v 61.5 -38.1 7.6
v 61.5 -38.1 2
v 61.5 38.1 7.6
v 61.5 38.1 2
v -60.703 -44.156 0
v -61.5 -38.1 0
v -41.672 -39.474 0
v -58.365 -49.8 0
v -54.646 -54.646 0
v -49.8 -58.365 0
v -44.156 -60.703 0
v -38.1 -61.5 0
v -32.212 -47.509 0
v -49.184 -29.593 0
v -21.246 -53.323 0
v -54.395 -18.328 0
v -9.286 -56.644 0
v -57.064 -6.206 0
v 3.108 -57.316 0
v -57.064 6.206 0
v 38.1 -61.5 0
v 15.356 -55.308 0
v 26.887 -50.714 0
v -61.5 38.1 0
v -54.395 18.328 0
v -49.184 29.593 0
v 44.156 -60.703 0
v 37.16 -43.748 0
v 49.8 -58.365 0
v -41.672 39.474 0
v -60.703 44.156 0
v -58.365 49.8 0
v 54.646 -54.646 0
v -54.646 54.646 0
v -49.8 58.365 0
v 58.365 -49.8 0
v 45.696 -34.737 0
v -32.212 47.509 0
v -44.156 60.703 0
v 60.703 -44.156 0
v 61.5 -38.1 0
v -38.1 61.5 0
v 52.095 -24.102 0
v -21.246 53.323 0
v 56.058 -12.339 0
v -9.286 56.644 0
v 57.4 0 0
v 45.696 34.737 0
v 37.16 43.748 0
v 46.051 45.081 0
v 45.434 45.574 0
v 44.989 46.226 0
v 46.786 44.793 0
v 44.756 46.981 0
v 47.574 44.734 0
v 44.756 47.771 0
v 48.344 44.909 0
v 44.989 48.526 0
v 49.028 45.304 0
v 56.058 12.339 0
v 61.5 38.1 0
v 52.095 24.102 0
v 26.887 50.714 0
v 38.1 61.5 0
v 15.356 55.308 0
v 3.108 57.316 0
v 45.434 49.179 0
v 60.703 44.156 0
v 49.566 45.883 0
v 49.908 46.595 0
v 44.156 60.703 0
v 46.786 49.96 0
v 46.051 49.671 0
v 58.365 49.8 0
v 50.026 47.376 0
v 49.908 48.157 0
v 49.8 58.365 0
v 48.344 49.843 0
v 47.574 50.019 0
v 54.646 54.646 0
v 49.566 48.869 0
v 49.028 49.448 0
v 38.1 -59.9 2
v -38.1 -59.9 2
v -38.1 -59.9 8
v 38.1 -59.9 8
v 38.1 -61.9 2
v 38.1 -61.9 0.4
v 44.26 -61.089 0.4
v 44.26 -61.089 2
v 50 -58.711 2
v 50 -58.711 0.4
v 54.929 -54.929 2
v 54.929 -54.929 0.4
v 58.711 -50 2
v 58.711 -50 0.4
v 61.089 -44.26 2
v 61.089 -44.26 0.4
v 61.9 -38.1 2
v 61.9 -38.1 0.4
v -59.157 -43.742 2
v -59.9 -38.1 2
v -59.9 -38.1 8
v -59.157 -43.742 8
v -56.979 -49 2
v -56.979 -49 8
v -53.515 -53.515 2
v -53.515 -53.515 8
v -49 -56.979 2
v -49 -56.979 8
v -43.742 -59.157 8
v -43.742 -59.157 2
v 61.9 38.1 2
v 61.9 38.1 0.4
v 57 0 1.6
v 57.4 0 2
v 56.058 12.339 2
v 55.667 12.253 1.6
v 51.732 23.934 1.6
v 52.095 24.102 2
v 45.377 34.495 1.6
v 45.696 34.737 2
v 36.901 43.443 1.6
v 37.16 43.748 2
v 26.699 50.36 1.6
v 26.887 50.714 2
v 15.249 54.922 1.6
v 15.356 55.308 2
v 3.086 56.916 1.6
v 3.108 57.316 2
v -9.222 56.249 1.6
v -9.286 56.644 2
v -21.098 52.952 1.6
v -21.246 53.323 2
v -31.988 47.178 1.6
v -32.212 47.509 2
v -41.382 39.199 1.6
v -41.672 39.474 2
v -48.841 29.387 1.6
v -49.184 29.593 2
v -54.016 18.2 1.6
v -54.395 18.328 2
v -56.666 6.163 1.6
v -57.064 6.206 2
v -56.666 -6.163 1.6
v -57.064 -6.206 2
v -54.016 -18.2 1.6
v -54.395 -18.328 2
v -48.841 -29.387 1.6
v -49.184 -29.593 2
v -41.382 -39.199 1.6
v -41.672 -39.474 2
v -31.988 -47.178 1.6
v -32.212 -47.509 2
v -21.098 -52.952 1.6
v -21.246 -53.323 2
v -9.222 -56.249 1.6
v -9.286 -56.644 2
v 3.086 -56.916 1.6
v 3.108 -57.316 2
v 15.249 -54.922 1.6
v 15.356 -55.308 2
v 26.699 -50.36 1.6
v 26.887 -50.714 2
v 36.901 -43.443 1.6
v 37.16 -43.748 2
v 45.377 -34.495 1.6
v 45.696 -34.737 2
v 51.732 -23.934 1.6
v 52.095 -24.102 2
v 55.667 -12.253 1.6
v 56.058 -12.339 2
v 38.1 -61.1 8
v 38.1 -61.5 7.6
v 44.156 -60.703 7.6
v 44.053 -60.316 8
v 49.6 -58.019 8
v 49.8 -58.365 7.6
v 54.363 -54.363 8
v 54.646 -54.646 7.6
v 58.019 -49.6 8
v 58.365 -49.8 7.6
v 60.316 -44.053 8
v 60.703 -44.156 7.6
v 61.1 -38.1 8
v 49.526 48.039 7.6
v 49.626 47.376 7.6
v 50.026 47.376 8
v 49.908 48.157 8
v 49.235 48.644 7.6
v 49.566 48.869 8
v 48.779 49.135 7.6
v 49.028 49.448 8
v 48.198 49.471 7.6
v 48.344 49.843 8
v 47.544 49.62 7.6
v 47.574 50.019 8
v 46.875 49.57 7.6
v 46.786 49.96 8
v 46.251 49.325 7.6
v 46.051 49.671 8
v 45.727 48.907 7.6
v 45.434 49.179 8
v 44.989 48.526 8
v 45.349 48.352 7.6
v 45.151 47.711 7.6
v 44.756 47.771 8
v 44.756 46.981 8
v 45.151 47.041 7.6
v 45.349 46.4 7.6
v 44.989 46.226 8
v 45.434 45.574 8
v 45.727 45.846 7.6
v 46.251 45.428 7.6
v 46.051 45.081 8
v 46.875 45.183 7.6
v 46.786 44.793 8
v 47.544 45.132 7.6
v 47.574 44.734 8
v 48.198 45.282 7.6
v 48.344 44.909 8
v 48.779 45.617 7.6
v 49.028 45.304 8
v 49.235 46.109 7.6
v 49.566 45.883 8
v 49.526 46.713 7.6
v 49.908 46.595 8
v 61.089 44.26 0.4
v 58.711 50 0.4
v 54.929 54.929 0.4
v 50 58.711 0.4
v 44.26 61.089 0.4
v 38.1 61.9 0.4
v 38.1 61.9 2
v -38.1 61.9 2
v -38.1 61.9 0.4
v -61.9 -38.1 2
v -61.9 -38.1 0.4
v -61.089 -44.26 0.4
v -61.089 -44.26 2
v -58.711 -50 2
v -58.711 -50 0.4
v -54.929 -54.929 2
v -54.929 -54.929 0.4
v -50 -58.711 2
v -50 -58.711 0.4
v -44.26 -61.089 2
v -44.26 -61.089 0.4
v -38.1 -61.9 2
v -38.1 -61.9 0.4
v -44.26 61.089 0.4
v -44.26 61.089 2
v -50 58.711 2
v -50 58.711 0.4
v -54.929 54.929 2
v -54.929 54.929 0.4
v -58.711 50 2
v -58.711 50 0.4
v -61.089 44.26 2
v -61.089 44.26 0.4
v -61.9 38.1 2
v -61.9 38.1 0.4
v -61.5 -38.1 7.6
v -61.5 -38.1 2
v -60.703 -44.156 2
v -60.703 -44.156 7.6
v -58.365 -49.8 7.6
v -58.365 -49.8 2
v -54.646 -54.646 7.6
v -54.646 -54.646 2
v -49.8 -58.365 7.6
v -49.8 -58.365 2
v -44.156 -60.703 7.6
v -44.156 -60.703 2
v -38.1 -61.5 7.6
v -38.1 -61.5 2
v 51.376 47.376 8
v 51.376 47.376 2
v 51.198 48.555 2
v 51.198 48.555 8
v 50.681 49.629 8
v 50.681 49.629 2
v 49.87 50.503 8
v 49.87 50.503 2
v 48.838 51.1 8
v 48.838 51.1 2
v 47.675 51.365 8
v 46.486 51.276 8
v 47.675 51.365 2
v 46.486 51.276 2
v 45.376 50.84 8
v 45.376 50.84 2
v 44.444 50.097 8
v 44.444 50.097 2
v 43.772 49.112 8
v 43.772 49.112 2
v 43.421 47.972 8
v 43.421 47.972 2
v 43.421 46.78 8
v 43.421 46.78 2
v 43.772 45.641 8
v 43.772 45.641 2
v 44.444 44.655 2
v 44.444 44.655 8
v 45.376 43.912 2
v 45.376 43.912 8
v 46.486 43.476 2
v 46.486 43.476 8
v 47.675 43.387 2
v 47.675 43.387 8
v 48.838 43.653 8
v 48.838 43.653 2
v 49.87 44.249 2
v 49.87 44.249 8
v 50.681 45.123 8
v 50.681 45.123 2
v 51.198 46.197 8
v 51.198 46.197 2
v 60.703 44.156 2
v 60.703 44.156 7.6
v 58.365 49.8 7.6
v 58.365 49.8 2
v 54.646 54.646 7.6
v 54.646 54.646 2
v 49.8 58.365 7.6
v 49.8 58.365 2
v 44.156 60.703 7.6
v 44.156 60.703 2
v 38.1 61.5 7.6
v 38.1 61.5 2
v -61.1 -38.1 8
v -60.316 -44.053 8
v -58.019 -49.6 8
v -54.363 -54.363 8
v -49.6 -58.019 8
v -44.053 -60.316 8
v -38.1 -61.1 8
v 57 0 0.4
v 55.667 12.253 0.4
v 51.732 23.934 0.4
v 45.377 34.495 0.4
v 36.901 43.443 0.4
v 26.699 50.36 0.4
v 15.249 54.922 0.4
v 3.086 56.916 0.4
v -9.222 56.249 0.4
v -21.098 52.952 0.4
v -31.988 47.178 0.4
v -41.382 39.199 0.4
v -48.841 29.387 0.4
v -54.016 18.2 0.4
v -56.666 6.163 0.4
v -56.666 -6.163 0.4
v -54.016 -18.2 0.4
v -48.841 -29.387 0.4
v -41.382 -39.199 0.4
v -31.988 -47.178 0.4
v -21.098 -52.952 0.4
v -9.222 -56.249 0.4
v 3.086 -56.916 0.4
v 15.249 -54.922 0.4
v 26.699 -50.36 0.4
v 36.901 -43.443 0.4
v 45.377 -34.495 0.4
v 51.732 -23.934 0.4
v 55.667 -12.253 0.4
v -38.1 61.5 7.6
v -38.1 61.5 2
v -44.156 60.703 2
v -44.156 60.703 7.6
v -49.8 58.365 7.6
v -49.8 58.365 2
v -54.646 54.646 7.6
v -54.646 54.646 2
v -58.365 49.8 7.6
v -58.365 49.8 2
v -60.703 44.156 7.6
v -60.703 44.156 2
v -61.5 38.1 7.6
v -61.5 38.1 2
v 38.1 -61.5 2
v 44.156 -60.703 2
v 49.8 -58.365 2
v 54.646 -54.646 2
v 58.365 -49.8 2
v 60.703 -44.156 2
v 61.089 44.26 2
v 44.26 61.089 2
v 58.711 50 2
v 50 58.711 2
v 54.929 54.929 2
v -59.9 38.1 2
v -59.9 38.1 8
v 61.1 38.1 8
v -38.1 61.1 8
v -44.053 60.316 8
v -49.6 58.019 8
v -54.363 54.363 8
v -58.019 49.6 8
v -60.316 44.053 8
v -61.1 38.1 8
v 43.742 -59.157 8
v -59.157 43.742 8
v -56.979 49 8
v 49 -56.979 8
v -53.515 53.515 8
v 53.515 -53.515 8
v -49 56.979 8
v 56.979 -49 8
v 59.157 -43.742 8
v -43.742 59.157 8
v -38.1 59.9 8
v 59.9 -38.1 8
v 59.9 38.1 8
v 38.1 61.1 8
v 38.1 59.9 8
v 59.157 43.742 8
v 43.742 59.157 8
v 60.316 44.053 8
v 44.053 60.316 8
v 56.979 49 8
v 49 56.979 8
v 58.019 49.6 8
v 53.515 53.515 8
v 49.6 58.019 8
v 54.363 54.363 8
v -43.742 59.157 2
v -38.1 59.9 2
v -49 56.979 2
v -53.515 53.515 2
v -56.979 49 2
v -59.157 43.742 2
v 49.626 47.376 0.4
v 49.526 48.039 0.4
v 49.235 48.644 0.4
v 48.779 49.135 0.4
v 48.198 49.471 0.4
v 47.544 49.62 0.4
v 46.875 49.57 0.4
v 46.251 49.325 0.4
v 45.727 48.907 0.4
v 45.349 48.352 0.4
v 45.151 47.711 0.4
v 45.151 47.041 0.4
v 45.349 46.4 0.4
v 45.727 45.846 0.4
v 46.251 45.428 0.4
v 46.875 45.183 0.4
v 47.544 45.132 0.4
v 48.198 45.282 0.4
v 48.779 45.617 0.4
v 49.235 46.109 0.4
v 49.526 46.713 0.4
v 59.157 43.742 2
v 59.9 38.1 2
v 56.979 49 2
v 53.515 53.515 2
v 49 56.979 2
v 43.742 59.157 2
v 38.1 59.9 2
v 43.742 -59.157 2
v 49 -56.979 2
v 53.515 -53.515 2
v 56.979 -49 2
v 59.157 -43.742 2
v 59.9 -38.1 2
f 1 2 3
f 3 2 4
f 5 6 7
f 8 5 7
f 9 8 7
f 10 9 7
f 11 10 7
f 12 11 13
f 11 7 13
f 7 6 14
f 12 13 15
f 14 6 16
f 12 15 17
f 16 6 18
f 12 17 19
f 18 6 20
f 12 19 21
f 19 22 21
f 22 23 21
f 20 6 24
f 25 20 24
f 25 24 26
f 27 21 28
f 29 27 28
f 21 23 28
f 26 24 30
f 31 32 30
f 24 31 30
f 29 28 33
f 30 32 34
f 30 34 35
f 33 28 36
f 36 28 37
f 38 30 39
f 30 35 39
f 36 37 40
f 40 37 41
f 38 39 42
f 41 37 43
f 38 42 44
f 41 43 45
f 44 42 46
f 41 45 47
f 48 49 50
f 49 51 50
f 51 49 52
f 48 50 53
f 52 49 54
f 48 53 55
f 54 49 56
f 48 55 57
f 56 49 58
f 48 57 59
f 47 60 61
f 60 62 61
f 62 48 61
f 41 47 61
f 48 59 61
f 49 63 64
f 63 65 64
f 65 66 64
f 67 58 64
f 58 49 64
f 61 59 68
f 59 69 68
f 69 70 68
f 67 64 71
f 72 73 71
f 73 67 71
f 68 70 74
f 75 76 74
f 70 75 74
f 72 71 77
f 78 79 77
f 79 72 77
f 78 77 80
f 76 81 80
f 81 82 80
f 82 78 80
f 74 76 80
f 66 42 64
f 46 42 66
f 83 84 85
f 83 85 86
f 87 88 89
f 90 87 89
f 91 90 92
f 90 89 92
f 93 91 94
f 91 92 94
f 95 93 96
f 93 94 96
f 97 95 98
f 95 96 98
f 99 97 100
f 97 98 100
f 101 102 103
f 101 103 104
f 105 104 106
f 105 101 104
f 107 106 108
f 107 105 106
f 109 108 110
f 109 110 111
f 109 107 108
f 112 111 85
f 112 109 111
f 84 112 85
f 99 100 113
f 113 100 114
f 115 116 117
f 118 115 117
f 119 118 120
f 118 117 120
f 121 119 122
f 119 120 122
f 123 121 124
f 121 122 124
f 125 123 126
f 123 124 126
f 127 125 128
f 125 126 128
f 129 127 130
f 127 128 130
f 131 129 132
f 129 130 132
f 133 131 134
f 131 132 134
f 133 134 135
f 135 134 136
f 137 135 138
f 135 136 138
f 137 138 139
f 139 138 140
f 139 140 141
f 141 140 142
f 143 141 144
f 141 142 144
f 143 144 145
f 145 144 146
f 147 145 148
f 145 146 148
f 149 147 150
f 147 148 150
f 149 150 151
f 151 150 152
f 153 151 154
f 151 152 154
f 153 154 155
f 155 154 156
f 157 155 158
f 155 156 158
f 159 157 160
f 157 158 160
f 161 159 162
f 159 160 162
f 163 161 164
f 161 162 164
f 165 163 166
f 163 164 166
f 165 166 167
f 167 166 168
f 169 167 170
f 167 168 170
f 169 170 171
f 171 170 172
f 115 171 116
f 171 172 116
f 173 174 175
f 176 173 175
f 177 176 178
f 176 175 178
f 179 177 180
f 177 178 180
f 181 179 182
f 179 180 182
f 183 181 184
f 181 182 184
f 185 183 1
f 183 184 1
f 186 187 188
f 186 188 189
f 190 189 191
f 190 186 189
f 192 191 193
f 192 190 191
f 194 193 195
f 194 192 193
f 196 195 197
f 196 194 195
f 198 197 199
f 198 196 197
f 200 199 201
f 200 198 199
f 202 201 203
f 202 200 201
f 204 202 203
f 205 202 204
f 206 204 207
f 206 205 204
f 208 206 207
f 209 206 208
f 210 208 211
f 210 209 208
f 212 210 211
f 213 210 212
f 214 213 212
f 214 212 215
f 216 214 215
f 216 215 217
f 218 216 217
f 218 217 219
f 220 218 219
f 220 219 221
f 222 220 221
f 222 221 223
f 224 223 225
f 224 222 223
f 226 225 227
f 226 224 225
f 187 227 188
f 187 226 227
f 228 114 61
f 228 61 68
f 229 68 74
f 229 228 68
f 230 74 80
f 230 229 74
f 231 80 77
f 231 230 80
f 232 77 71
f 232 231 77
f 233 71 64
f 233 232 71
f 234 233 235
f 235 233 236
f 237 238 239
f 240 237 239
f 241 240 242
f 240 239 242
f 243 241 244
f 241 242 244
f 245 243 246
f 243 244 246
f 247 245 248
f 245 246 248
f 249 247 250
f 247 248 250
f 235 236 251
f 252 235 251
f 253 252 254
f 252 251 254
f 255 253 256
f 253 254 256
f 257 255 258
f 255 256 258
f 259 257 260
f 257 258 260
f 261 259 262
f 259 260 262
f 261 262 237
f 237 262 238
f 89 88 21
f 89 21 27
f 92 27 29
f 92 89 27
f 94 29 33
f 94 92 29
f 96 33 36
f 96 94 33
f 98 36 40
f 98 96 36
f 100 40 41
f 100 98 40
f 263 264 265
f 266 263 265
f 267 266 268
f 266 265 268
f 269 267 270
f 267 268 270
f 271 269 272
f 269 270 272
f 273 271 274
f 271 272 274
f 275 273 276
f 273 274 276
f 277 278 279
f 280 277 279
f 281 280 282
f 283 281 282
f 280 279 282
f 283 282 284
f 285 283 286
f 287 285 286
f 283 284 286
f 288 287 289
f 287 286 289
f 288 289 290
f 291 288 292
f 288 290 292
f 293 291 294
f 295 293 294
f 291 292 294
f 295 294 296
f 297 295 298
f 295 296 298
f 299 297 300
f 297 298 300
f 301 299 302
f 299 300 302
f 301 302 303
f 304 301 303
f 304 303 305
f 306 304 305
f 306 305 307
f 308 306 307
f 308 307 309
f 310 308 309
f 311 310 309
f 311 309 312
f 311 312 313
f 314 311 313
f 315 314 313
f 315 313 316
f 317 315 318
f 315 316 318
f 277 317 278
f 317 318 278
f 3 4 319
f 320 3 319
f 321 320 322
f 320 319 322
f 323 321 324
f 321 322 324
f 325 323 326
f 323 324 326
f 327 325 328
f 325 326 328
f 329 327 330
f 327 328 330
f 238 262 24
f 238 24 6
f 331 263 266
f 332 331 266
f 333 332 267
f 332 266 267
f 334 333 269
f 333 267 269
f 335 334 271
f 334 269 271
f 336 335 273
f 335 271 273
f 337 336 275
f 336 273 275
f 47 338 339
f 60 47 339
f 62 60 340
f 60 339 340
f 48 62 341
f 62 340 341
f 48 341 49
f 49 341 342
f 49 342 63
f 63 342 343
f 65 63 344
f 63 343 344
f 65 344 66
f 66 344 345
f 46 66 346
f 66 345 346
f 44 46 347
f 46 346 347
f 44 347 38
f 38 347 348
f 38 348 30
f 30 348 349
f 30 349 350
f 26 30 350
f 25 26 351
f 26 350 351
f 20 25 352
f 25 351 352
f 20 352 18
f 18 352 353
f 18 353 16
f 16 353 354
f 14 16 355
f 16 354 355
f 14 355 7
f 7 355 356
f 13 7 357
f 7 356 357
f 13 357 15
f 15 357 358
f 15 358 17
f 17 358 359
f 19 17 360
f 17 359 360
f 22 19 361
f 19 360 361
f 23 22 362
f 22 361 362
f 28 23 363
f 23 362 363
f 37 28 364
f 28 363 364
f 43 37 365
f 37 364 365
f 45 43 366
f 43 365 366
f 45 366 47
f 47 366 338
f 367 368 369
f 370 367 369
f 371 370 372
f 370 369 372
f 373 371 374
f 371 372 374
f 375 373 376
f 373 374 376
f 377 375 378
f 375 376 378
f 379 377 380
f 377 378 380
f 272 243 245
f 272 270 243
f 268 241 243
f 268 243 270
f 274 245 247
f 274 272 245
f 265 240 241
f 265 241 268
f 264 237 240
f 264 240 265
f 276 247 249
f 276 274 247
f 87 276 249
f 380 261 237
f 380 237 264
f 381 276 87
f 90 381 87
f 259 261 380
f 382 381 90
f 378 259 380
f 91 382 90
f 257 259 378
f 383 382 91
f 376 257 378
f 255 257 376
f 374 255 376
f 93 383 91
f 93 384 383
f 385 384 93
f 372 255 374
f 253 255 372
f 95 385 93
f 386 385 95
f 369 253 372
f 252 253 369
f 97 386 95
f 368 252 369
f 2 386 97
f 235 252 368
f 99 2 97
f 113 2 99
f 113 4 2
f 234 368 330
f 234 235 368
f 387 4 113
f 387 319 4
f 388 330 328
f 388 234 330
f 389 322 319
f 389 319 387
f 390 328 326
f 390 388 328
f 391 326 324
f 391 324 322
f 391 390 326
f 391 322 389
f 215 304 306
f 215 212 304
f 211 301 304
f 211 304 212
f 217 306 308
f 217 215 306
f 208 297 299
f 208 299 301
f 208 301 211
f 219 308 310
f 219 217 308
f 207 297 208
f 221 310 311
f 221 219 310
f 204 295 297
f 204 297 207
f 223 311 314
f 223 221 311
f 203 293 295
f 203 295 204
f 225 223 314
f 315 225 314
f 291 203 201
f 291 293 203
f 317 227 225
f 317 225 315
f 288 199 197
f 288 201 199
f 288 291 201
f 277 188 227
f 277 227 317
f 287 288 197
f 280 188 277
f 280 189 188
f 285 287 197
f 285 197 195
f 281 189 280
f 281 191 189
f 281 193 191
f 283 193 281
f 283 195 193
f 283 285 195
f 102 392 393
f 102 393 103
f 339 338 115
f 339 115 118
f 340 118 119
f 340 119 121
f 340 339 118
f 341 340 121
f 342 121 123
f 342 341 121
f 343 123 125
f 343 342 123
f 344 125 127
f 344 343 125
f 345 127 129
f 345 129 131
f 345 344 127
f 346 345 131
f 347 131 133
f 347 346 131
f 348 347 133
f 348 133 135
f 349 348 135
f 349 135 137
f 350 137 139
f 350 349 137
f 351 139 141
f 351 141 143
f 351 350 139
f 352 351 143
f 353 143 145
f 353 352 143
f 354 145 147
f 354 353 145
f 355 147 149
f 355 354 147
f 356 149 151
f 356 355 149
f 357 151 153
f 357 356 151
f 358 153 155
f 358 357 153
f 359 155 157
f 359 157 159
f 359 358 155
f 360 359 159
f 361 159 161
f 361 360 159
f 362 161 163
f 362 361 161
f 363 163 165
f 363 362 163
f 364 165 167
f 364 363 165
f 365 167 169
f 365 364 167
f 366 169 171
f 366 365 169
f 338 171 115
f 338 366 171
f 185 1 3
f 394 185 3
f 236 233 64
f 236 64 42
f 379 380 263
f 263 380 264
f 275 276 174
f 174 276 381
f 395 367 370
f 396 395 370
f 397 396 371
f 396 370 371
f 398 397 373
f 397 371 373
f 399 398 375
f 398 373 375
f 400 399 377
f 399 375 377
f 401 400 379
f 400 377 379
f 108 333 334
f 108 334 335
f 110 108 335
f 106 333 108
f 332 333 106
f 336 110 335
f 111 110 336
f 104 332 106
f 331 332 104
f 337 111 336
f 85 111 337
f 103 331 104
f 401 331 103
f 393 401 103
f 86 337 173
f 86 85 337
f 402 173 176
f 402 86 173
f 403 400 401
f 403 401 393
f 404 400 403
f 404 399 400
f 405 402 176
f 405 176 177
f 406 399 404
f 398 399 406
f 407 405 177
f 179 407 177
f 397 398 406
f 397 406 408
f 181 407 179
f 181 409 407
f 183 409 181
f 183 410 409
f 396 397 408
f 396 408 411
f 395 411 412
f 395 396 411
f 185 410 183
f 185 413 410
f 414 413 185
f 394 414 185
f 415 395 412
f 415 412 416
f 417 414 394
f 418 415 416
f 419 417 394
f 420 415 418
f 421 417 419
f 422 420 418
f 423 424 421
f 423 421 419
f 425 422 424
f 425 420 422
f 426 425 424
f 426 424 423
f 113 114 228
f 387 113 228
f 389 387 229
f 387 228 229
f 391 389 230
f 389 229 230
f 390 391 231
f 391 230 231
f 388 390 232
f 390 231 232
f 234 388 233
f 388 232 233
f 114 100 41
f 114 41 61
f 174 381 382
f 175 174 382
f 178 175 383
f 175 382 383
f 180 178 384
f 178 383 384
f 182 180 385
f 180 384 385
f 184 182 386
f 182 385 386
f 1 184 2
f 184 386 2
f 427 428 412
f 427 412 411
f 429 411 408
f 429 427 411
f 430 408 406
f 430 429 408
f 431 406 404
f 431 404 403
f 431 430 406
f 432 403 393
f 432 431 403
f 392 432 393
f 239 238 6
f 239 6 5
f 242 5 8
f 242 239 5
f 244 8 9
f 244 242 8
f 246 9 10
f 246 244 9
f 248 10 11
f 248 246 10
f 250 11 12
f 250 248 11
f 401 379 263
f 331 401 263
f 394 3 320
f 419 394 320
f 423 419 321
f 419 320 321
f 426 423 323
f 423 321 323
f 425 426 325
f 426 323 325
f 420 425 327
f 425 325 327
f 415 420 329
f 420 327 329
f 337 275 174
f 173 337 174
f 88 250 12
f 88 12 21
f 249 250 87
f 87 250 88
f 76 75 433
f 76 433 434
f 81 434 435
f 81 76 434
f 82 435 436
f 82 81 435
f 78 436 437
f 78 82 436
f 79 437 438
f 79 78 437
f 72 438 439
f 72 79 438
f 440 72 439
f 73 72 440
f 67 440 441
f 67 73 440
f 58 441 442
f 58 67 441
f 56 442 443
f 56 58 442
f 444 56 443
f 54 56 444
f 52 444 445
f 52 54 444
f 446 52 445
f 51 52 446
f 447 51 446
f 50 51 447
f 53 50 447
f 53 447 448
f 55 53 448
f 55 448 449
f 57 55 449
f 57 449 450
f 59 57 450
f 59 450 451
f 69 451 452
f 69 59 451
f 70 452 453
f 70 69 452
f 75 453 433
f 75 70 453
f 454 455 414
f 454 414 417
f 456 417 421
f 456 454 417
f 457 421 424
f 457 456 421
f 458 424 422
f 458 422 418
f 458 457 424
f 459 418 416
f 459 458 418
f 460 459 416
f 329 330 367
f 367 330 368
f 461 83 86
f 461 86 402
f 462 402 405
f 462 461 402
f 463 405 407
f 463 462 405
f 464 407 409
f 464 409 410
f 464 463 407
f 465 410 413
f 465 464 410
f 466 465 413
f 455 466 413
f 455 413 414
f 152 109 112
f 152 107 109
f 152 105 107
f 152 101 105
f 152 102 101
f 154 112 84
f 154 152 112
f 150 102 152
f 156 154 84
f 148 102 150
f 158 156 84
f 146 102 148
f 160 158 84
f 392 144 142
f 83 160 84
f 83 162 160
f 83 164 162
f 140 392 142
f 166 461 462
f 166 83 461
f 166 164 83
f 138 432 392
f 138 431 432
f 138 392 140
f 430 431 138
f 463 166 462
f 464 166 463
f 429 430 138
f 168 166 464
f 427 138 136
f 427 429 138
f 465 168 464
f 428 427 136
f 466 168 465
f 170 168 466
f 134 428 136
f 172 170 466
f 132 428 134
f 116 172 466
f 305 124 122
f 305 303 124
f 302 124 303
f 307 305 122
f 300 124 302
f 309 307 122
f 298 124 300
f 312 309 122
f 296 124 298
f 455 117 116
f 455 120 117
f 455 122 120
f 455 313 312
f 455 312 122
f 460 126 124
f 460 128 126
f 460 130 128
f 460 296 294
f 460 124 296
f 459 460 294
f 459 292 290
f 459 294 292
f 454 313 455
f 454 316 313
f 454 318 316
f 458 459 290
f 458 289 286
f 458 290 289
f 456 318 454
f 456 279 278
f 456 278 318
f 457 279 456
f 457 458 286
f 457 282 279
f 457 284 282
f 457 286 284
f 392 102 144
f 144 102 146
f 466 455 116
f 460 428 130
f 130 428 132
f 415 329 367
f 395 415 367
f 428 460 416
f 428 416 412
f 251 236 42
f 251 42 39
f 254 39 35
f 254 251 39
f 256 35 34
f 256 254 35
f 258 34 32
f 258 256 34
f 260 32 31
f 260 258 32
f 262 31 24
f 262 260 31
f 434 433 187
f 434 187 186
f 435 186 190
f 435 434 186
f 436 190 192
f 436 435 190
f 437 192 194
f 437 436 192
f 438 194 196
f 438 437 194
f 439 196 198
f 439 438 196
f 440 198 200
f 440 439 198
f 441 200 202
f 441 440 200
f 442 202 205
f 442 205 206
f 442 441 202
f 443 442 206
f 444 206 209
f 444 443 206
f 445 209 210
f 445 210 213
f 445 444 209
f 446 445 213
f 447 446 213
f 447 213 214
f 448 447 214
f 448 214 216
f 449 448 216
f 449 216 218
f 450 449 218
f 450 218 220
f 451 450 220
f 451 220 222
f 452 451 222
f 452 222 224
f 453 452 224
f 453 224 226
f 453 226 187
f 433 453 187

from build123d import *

# Parameters (mm, degrees)
SKETCH_R      = 2.25
SKETCH_R_2    = 57
PAD_DEPTH     = 2
PAD006_DEPTH  = 8
SKETCH014_R   = 4
SKETCH014_R_2 = 2.25
PAD009_DEPTH  = 6
CHAMFER_SIZE  = 0.4


with BuildPart() as part:
    # Sketch → Pad (new body)
    with BuildSketch(Plane.XY):
        with BuildLine():
            Line((-61.9, 38.1), (-61.9, -38.1))
            ThreePointArc((-61.9, -38.1), (-54.929141, -54.929141), (-38.1, -61.9))
            Line((-38.1, -61.9), (38.1, -61.9))
            ThreePointArc((38.1, -61.9), (54.929141, -54.929141), (61.9, -38.1))
            Line((61.9, -38.1), (61.9, 38.1))
            ThreePointArc((61.9, 38.1), (54.929141, 54.929141), (38.1, 61.9))
            Line((38.1, 61.9), (-38.1, 61.9))
            ThreePointArc((-38.1, 61.9), (-54.929141, 54.929141), (-61.9, 38.1))
        make_face()
        with Locations((47.376154, 47.376154)):
            Circle(SKETCH_R, mode=Mode.SUBTRACT)
        Circle(SKETCH_R_2, mode=Mode.SUBTRACT)
    extrude(amount=PAD_DEPTH)

    # Sketch008 → Pad006 (join)
    with BuildSketch(Plane.XY):
        with BuildLine():
            Line((-61.5, 38.1), (-61.5, -38.1))
            ThreePointArc((-61.5, -38.1), (-54.646299, -54.646299), (-38.1, -61.5))
            Line((-38.1, -61.5), (38.1, -61.5))
            ThreePointArc((38.1, -61.5), (54.646299, -54.646299), (61.5, -38.1))
            Line((61.5, -38.1), (61.5, 38.1))
            ThreePointArc((61.5, 38.1), (54.646299, 54.646299), (38.1, 61.5))
            Line((38.1, 61.5), (-38.1, 61.5))
            ThreePointArc((-38.1, 61.5), (-54.646299, 54.646299), (-61.5, 38.1))
        make_face()
        with BuildLine():
            Line((-59.9, 38.1), (-59.9, -38.1))
            ThreePointArc((-59.9, -38.1), (-53.514928, -53.514928), (-38.1, -59.9))
            Line((-38.1, -59.9), (38.1, -59.9))
            ThreePointArc((38.1, -59.9), (53.514928, -53.514928), (59.9, -38.1))
            Line((59.9, -38.1), (59.9, 38.1))
            ThreePointArc((59.9, 38.1), (53.514928, 53.514928), (38.1, 59.9))
            Line((38.1, 59.9), (-38.1, 59.9))
            ThreePointArc((-38.1, 59.9), (-53.514928, 53.514928), (-59.9, 38.1))
        make_face(mode=Mode.SUBTRACT)
    extrude(amount=PAD006_DEPTH)

    # Sketch014 (on Face27 of Pad006) → Pad009 (join)
    with BuildSketch(Plane.XY.offset(2)):
        with Locations((47.376154, 47.376154)):
            Circle(SKETCH014_R)
        with Locations((47.376154, 47.376154)):
            Circle(SKETCH014_R_2, mode=Mode.SUBTRACT)
    extrude(amount=PAD009_DEPTH)

    # Chamfer
    chamfer_edges = [part.edges().sort_by_distance(p)[0] for p in [
        (-57, 0, 2),
        (45.126154, 47.376154, 8),
        (0, 61.5, 8),
        (-61.9, 0, 0),
        (-54.929141, 54.929141, 0),
        (0, 61.9, 0),
        (54.929141, 54.929141, 0),
        (61.9, 0, 0),
        (54.929141, -54.929141, 0),
        (0, -61.9, 0),
        (-54.929141, -54.929141, 0),
        (-57, 0, 0),
        (45.126154, 47.376154, 0),
    ]]
    chamfer(chamfer_edges, length=CHAMFER_SIZE)


solid = part.part
